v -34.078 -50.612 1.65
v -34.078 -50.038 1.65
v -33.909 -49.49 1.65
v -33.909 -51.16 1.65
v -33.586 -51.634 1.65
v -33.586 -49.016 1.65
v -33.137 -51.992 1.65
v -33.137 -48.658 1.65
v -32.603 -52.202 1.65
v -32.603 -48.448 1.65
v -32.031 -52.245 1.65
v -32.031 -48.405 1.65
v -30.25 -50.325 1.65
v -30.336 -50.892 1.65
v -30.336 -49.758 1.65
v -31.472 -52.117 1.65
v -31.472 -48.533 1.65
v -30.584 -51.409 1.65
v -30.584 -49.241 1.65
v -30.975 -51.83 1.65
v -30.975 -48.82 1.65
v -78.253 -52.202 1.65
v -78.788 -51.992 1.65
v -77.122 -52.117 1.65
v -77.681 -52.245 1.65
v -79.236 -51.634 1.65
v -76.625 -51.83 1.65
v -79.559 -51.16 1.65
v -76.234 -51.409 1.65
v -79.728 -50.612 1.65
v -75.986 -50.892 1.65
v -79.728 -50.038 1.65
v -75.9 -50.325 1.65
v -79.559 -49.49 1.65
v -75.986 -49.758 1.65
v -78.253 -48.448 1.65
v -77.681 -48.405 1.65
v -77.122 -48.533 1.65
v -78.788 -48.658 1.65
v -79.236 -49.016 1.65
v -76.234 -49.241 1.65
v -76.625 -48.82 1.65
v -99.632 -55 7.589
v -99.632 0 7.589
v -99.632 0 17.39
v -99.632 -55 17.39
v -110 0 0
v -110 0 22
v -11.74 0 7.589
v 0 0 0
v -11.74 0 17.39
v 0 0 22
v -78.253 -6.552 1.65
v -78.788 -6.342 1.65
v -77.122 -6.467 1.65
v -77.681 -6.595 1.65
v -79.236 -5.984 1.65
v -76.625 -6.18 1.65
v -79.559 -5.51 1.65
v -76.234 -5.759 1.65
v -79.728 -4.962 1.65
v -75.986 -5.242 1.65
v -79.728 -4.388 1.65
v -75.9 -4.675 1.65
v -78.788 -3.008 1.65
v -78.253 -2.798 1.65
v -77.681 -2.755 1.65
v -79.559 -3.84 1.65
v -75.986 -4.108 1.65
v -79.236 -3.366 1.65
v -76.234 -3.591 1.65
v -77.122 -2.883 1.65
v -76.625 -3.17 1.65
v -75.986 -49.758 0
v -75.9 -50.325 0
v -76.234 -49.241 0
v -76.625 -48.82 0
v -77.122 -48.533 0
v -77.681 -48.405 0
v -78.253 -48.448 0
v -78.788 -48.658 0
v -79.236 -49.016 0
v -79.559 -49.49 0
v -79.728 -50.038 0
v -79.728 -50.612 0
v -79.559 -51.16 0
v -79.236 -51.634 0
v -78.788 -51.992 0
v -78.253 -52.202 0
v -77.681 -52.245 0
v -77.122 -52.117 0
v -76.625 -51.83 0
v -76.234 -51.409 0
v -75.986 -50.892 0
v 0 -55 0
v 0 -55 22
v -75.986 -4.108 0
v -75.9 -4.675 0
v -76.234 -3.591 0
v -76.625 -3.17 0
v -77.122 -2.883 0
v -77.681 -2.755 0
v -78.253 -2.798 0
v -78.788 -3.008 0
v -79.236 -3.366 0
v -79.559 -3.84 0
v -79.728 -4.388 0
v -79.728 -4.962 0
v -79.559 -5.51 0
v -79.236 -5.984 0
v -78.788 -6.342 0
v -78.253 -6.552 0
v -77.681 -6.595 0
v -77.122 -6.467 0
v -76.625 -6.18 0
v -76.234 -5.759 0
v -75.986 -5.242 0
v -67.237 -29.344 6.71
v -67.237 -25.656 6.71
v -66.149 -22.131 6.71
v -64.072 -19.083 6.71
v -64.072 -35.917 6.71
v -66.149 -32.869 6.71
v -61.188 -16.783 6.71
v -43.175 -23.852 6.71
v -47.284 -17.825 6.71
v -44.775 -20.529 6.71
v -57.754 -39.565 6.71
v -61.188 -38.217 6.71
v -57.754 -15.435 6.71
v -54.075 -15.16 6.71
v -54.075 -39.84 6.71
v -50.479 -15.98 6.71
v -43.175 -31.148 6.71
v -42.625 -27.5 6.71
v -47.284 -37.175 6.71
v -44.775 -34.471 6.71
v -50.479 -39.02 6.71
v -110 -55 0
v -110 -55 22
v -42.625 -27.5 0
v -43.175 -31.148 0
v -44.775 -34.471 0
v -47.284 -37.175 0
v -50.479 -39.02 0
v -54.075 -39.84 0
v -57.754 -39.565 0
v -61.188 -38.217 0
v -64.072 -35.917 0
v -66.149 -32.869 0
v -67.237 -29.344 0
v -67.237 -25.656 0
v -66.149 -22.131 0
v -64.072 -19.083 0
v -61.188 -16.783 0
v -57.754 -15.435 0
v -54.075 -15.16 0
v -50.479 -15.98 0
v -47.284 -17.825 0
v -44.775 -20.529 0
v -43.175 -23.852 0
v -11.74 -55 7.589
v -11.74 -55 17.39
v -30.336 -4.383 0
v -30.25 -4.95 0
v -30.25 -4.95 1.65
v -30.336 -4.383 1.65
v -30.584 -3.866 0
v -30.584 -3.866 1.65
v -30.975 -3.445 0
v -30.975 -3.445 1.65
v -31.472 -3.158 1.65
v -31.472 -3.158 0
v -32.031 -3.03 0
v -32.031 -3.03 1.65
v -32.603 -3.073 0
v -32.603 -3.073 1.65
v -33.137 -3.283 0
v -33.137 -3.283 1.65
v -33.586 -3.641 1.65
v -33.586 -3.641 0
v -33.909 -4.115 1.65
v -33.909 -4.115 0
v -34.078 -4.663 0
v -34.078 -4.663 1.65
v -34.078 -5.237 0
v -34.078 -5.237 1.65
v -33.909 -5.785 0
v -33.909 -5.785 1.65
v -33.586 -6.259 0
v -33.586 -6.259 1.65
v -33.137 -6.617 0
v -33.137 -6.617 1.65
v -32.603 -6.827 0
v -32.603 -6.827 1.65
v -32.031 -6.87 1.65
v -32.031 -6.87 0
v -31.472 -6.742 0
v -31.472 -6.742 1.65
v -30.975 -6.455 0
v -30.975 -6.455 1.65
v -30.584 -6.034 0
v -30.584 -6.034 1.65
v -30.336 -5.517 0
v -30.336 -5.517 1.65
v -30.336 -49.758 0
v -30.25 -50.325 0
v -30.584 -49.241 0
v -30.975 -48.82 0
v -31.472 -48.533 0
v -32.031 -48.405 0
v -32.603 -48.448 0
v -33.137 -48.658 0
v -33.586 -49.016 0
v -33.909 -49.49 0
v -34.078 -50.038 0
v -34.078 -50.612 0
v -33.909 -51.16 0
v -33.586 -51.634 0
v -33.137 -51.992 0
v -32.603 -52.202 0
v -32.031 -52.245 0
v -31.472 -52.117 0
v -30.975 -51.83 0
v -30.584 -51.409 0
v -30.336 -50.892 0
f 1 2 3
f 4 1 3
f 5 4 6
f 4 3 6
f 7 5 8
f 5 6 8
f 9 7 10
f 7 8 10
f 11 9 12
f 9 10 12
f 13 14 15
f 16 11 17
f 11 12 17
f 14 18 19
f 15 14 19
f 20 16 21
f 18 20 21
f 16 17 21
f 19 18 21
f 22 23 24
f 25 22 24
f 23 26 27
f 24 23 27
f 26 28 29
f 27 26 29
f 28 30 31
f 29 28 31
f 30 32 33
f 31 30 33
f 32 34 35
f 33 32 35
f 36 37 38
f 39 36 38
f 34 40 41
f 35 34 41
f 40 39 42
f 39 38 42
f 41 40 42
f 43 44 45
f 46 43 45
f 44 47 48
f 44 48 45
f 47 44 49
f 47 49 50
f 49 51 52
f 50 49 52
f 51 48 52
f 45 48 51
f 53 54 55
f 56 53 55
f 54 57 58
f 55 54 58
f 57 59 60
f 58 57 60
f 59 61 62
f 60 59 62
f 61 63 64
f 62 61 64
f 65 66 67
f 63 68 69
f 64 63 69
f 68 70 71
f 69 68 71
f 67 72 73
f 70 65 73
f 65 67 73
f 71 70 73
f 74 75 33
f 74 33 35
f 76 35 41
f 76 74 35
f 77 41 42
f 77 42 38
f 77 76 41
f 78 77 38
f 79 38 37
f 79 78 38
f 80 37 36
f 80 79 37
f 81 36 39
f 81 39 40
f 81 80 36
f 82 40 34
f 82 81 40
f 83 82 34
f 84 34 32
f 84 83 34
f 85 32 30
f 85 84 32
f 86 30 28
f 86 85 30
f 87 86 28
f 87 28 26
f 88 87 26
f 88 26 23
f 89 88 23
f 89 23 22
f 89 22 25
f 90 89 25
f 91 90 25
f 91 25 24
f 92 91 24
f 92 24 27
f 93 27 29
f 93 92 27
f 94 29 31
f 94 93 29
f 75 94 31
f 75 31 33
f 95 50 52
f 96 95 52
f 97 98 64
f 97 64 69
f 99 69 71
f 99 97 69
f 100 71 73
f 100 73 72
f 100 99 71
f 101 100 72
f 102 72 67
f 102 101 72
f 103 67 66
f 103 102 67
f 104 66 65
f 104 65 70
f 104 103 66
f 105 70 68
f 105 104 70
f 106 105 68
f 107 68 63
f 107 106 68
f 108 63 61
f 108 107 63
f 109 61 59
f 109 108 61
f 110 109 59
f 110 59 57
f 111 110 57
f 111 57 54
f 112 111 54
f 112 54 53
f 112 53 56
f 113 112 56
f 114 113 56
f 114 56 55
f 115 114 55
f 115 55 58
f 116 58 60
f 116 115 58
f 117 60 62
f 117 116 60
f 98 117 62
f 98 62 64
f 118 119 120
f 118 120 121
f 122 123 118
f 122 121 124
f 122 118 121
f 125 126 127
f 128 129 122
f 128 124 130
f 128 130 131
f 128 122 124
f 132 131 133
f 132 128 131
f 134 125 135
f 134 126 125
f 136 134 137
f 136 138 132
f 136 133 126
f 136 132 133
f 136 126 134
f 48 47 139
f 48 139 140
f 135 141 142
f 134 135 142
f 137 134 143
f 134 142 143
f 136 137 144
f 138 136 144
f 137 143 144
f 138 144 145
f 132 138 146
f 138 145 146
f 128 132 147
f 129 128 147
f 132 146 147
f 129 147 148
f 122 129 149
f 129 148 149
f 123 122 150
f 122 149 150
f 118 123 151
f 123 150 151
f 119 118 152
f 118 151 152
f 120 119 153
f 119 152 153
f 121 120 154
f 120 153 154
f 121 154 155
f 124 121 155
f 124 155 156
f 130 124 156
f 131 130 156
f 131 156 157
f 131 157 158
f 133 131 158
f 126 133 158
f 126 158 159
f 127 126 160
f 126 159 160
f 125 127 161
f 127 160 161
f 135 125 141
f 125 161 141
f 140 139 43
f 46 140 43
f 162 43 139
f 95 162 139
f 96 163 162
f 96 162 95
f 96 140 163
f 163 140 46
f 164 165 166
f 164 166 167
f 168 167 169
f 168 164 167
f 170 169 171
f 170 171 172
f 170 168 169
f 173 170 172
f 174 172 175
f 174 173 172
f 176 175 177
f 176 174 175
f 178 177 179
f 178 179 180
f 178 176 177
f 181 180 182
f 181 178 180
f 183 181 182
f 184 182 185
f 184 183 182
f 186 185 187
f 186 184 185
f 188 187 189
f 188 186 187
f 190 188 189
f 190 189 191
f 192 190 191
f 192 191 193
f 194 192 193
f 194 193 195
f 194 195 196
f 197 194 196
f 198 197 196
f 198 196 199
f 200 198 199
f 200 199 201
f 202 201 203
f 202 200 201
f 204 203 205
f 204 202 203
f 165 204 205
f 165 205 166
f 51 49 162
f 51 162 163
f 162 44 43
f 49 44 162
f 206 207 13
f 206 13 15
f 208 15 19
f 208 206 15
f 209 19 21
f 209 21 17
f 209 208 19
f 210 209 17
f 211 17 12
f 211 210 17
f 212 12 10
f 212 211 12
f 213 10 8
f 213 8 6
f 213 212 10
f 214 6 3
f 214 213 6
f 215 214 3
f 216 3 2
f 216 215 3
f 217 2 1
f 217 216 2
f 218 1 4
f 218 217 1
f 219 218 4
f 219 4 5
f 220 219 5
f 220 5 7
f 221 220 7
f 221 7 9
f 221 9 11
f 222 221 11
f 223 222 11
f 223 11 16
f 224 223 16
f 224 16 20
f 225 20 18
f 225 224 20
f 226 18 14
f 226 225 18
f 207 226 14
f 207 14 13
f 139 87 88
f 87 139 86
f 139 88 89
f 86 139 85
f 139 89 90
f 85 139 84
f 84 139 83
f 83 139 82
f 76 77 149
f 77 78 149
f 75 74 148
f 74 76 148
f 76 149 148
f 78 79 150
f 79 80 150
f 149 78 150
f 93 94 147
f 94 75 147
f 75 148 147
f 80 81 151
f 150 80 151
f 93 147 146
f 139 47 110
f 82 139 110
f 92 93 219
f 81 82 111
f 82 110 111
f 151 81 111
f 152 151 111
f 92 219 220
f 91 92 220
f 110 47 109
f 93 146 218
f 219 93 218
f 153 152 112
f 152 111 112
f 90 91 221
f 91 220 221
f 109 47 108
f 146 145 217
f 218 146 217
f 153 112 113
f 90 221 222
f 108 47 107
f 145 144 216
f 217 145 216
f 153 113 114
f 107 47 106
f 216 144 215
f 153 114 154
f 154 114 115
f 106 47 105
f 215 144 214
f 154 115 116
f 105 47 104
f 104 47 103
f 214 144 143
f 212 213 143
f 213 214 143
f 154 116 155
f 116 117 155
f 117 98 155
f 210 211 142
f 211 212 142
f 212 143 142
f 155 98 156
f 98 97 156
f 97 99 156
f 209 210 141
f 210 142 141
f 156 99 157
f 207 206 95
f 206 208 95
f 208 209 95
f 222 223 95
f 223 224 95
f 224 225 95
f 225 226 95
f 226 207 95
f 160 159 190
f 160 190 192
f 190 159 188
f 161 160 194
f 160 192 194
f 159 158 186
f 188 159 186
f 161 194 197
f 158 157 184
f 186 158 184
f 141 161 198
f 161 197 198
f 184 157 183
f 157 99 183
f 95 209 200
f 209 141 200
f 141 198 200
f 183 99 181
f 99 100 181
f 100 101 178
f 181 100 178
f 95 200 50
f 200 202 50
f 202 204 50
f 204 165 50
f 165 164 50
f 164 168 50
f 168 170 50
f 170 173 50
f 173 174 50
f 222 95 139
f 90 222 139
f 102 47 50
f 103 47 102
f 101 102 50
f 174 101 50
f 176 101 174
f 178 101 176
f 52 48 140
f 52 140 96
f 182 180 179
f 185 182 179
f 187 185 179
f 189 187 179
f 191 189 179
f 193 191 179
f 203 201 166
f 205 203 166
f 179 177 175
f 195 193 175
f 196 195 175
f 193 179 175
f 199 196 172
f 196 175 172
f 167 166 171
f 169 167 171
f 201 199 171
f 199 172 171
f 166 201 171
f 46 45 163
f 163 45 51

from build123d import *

# Parameters (mm, degrees)
F0_W     = 2000
F0_H     = 425
F0_W_2   = 1598.0344712734
F0_H_2   = 178.1892329454
F1_DEPTH = 1000
F2_DEPTH = 25
F3_R     = 35
F4_DEPTH = 30
F5_R     = 225
F6_DEPTH = 122
F7_SCALE = 0.055


with BuildPart() as f1:
    # F0 (on Front) → F1 (new body)
    with BuildSketch(Plane.XZ):
        with Locations((-1000, 212.5)):
            Rectangle(F0_W, F0_H)
        with Locations((-1012.4687701464, 227.0783409476)):
            Rectangle(F0_W_2, F0_H_2, mode=Mode.SUBTRACT)
    extrude(amount=F1_DEPTH)

    # F2 (cut): a face of the model
    f2_faces = [f1.faces().sort_by_distance(p)[0] for p in [
        (-1000, -500, 425),
    ]]
    extrude(f2_faces, amount=-F2_DEPTH, mode=Mode.SUBTRACT)

    # F3 (on Top) → F4 (cut)
    with BuildSketch(Plane.XY):
        with Locations((-1415, -85)):
            Circle(F3_R)
        with Locations((-1415, -915)):
            Circle(F3_R)
        with Locations((-585, -915)):
            Circle(F3_R)
        with Locations((-585, -90)):
            Circle(F3_R)
    extrude(amount=F4_DEPTH, mode=Mode.SUBTRACT)

    # F5 (on face) → F6 (cut)
    with BuildSketch(Plane(origin=(0, 0, 0), x_dir=(1, 0, 0), z_dir=(0, 0, -1))):
        with Locations((-1000, 500)):
            Circle(F5_R)
    extrude(amount=-F6_DEPTH, mode=Mode.SUBTRACT)


with BuildPart() as f1_1:
    # F7: moved
    add(f1.part.scale(F7_SCALE))


solid = f1_1.part
